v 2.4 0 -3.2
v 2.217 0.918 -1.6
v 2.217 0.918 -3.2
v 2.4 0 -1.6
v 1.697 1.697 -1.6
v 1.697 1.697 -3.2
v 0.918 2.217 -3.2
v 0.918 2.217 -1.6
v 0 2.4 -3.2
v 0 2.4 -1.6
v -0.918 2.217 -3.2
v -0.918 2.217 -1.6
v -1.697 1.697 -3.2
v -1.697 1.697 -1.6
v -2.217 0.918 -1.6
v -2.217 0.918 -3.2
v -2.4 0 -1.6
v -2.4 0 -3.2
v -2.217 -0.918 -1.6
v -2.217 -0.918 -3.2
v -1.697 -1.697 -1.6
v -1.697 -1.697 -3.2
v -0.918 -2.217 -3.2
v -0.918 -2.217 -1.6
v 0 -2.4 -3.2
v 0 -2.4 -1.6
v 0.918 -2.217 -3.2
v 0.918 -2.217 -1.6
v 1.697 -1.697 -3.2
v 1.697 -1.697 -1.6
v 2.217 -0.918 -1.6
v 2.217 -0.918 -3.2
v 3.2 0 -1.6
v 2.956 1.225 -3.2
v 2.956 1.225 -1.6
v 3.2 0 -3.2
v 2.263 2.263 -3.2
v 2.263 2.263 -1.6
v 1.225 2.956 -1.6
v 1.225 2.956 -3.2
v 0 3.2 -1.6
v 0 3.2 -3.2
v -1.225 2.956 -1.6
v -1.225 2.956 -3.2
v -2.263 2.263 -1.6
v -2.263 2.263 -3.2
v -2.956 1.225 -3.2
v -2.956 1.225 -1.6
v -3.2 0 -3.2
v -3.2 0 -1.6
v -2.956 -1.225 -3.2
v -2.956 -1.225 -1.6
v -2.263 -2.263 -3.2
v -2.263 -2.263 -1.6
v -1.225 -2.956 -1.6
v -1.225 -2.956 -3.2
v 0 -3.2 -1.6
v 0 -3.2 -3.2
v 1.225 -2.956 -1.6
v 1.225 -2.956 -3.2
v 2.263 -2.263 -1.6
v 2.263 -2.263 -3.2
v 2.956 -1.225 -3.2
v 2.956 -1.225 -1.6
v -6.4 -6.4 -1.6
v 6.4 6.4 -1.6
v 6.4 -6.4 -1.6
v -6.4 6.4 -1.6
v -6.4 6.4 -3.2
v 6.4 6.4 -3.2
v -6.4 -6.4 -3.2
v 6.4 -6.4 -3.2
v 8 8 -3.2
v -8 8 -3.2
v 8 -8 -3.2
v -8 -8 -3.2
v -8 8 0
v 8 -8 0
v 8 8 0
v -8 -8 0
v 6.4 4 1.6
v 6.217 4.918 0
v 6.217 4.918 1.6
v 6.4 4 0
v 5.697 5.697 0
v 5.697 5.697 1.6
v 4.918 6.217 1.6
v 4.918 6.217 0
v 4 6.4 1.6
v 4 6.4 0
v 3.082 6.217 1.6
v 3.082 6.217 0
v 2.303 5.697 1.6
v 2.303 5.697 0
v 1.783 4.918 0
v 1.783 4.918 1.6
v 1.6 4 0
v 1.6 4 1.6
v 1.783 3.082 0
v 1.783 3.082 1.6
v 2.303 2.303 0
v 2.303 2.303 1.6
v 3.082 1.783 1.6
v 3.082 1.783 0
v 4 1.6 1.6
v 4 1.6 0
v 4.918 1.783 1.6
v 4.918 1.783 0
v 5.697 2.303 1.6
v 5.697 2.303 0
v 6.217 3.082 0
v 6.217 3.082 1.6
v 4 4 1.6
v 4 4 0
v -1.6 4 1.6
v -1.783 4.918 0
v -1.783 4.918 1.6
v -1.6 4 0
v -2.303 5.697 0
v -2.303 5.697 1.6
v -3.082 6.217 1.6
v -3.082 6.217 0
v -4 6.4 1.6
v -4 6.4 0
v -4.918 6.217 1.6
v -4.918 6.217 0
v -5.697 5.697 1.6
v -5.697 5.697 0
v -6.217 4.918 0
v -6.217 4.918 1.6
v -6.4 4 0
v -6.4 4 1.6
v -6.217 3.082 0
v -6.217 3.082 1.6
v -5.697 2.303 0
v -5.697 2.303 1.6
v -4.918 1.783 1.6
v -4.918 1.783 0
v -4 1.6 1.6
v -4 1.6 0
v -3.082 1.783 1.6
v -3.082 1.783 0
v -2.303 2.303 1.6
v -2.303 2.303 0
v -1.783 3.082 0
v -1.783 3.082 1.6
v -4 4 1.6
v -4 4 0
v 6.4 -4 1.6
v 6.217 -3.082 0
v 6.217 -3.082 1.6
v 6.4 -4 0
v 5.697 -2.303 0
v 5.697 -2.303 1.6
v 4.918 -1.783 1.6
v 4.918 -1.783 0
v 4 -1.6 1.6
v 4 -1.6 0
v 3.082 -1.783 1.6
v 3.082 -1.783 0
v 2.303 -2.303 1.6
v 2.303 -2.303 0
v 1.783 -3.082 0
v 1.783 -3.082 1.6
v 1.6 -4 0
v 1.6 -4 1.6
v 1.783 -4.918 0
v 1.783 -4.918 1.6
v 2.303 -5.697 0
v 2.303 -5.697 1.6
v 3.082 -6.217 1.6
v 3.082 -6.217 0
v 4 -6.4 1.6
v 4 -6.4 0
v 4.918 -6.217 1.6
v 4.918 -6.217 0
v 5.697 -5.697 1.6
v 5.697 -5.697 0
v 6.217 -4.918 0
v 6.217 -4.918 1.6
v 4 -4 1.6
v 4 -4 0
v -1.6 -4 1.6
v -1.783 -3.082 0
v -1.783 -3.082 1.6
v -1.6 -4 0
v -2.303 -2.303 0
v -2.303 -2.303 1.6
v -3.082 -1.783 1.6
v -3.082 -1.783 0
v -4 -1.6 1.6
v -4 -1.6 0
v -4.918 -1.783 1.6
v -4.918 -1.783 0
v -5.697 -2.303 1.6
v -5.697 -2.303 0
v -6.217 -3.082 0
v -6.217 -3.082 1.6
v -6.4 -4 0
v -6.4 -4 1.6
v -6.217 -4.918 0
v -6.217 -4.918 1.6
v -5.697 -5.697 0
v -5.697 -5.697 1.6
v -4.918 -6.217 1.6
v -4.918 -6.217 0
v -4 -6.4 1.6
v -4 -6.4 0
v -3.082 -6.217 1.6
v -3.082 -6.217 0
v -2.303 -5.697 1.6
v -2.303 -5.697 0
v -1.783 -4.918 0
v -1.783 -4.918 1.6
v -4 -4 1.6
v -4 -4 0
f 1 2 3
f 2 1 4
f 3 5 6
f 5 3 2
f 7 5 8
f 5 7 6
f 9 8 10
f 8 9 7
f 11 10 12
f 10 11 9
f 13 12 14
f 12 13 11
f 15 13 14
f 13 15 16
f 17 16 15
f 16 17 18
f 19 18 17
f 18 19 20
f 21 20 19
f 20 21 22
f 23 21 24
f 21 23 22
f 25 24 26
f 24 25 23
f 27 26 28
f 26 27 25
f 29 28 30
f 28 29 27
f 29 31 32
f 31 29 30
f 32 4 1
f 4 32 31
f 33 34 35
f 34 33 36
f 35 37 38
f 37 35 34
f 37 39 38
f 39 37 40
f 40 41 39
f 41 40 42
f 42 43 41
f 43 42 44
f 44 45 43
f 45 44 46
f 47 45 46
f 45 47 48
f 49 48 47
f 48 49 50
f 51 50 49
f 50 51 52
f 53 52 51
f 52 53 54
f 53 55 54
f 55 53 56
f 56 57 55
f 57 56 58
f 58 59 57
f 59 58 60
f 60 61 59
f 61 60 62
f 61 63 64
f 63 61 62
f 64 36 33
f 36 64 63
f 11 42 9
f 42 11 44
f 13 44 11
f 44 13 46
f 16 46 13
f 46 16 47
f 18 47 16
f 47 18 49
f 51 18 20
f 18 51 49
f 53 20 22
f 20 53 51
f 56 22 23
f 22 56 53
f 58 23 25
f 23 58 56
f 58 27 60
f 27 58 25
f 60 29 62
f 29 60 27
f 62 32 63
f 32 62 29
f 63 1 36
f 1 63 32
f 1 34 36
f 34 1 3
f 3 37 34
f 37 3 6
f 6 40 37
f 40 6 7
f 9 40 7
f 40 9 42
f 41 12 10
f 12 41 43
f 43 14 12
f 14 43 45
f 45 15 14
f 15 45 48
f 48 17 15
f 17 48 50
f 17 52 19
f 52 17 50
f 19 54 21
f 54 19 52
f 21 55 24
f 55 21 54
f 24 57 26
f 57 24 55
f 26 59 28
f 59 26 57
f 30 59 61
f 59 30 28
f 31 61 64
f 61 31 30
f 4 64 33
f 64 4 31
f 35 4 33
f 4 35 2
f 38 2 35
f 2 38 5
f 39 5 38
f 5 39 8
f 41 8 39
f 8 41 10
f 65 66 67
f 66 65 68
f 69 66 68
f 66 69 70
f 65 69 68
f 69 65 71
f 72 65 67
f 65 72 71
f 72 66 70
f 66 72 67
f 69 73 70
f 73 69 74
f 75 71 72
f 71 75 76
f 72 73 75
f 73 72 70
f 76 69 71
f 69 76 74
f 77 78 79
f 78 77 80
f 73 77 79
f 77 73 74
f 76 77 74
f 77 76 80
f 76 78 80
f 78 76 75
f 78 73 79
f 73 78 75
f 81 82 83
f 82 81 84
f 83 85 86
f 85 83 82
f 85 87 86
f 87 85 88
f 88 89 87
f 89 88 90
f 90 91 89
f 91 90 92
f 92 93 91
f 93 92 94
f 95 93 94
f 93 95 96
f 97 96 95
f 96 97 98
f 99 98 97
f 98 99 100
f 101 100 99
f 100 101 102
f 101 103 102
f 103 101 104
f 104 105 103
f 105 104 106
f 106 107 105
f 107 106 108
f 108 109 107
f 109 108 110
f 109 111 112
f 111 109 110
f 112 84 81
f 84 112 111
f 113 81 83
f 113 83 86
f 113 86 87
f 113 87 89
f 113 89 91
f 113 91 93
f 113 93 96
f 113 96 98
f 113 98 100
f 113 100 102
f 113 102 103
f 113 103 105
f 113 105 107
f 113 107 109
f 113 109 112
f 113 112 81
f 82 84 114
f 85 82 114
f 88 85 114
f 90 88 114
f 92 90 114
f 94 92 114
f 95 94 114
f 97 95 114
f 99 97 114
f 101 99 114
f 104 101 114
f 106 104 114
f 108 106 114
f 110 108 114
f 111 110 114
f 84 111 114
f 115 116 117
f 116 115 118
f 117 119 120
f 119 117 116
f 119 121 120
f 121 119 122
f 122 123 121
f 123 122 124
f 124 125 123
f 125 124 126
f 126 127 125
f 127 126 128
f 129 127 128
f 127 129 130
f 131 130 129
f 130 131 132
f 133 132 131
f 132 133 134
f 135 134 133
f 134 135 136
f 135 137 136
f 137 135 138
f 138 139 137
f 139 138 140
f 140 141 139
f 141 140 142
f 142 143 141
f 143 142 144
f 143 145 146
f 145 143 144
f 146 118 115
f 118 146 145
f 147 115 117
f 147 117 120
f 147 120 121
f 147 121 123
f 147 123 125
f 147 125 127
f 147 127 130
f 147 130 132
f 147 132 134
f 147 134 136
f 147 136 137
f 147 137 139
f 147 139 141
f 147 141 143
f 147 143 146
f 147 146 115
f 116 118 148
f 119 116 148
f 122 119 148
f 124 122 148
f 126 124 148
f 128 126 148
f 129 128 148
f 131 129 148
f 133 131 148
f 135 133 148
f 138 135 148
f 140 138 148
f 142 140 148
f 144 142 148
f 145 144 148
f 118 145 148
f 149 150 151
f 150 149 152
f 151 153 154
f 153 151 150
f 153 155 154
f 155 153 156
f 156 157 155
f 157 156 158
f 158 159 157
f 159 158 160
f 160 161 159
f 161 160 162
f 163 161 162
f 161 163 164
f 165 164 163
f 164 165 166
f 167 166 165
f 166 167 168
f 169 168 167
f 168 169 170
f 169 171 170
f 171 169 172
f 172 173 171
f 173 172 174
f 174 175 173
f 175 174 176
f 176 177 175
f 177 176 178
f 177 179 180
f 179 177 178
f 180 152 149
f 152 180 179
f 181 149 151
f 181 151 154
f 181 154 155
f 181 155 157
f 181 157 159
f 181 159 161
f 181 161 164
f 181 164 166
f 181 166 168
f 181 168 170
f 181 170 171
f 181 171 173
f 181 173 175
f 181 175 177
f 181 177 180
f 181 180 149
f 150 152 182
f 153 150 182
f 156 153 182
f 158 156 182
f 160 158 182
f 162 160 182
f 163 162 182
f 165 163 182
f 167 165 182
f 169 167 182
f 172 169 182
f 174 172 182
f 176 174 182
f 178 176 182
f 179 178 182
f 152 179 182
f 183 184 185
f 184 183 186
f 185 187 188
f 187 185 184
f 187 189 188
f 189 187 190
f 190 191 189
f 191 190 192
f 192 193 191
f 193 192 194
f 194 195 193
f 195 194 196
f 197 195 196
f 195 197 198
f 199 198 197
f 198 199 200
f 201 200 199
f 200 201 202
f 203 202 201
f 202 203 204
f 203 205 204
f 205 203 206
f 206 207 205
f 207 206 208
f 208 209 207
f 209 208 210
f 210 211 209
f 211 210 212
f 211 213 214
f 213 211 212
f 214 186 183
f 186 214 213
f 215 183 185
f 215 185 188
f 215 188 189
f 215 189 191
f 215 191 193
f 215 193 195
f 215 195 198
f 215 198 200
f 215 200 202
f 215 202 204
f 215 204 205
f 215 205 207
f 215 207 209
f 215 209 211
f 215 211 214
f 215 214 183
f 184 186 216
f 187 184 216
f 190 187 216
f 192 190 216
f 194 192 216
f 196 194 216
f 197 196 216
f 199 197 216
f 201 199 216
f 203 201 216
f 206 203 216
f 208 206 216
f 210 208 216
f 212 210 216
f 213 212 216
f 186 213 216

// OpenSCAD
// file: ../p/4-4ring3.scad
use <../lib.scad>
$fa=1; $fs=0.2;
function ldraw_lib__4_4ring3(realsolid=false) = [
// 0 Ring  3 x 1.0
// 0 Name: 4-4ring3.dat
// 0 Author: James Jessiman
// 0 !LDRAW_ORG Primitive UPDATE 2009-01
// 0 !LICENSE Licensed under CC BY 2.0 and CC BY 4.0 : see CAreadme.txt
// 
// 0 BFC CERTIFY CCW
  [0,"BFC","CERTIFY"],
  [0,"BFC","CCW"],
// 
// 0 !HISTORY 1998-12-15 [PTadmin] Official Update 1998-10
// 0 !HISTORY 2002-04-05 [hafhead] Added BFC statement
// 0 !HISTORY 2002-04-25 [PTadmin] Official Update 2002-02
// 0 !HISTORY 2007-06-24 [PTadmin] Header formatted for Contributor Agreement
// 0 !HISTORY 2008-07-01 [PTadmin] Official Update 2008-01
// 0 !HISTORY 2008-08-26 [cwdee] Switch polygon winding and rename
// 0 !HISTORY 2009-05-02 [PTadmin] Official Update 2009-01
// 
// 
// 4 16 -1.5308 0 3.6956 -1.1481 0 2.7717 0 0 3 0 0 4
  [4,16,-1.5308,0,3.6956,-1.1481,0,2.7717,0,0,3,0,0,4],
// 4 16 -2.8284 0 2.8284 -2.1213 0 2.1213 -1.1481 0 2.7717 -1.5308 0 3.6956
  [4,16,-2.8284,0,2.8284,-2.1213,0,2.1213,-1.1481,0,2.7717,-1.5308,0,3.6956],
// 4 16 -3.6956 0 1.5308 -2.7717 0 1.1481 -2.1213 0 2.1213 -2.8284 0 2.8284
  [4,16,-3.6956,0,1.5308,-2.7717,0,1.1481,-2.1213,0,2.1213,-2.8284,0,2.8284],
// 4 16 -4 0 0 -3 0 0 -2.7717 0 1.1481 -3.6956 0 1.5308
  [4,16,-4,0,0,-3,0,0,-2.7717,0,1.1481,-3.6956,0,1.5308],
// 4 16 -3.6956 0 -1.5308 -2.7717 0 -1.1481 -3 0 0 -4 0 0
  [4,16,-3.6956,0,-1.5308,-2.7717,0,-1.1481,-3,0,0,-4,0,0],
// 4 16 -2.8284 0 -2.8284 -2.1213 0 -2.1213 -2.7717 0 -1.1481 -3.6956 0 -1.5308
  [4,16,-2.8284,0,-2.8284,-2.1213,0,-2.1213,-2.7717,0,-1.1481,-3.6956,0,-1.5308],
// 4 16 -1.5308 0 -3.6956 -1.1481 0 -2.7717 -2.1213 0 -2.1213 -2.8284 0 -2.8284
  [4,16,-1.5308,0,-3.6956,-1.1481,0,-2.7717,-2.1213,0,-2.1213,-2.8284,0,-2.8284],
// 4 16 0 0 -4 0 0 -3 -1.1481 0 -2.7717 -1.5308 0 -3.6956
  [4,16,0,0,-4,0,0,-3,-1.1481,0,-2.7717,-1.5308,0,-3.6956],
// 4 16 1.5308 0 -3.6956 1.1481 0 -2.7717 0 0 -3 0 0 -4
  [4,16,1.5308,0,-3.6956,1.1481,0,-2.7717,0,0,-3,0,0,-4],
// 4 16 2.8284 0 -2.8284 2.1213 0 -2.1213 1.1481 0 -2.7717 1.5308 0 -3.6956
  [4,16,2.8284,0,-2.8284,2.1213,0,-2.1213,1.1481,0,-2.7717,1.5308,0,-3.6956],
// 4 16 3.6956 0 -1.5308 2.7717 0 -1.1481 2.1213 0 -2.1213 2.8284 0 -2.8284
  [4,16,3.6956,0,-1.5308,2.7717,0,-1.1481,2.1213,0,-2.1213,2.8284,0,-2.8284],
// 4 16 4 0 0 3 0 0 2.7717 0 -1.1481 3.6956 0 -1.5308
  [4,16,4,0,0,3,0,0,2.7717,0,-1.1481,3.6956,0,-1.5308],
// 4 16 3.6956 0 1.5308 2.7717 0 1.1481 3 0 0 4 0 0
  [4,16,3.6956,0,1.5308,2.7717,0,1.1481,3,0,0,4,0,0],
// 4 16 2.8284 0 2.8284 2.1213 0 2.1213 2.7717 0 1.1481 3.6956 0 1.5308
  [4,16,2.8284,0,2.8284,2.1213,0,2.1213,2.7717,0,1.1481,3.6956,0,1.5308],
// 4 16 1.5308 0 3.6956 1.1481 0 2.7717 2.1213 0 2.1213 2.8284 0 2.8284
  [4,16,1.5308,0,3.6956,1.1481,0,2.7717,2.1213,0,2.1213,2.8284,0,2.8284],
// 4 16 0 0 4 0 0 3 1.1481 0 2.7717 1.5308 0 3.6956
  [4,16,0,0,4,0,0,3,1.1481,0,2.7717,1.5308,0,3.6956],
// 0
];
module ldraw_lib__4_4ring3(step=0, col=false, unit=2/5, alt=false, line=0.2, solid=!$preview)
    makepoly(ldraw_lib__4_4ring3(solid), step=step, col=col, unit=unit, alt=alt, line=line, solid=solid);
ldraw_lib__4_4ring3(line=0.2);
// file: ../p/4-4edge.scad
use <../lib.scad>
function ldraw_lib__4_4edge() = [
// 0 Circle 1.0
// 0 Name: 4-4edge.dat
// 0 Author: James Jessiman
// 0 !LDRAW_ORG Primitive UPDATE 2017-01
// 0 !LICENSE Licensed under CC BY 2.0 and CC BY 4.0 : see CAreadme.txt
// 
// 0 BFC CERTIFY CCW
  [0,"BFC","CERTIFY"],
  [0,"BFC","CCW"],
// 
// 0 !HISTORY 1998-12-15 [PTadmin] Official Update 1998-10
// 0 !HISTORY 2005-12-28 [PTadmin] Official Update 2005-01
// 0 !HISTORY 2007-06-24 [PTadmin] Header formatted for Contributor Agreement
// 0 !HISTORY 2008-07-01 [PTadmin] Official Update 2008-01
// 0 !HISTORY 2017-01-15 [Steffen] BFCed
// 0 !HISTORY 2017-12-30 [PTadmin] Official Update 2017-01
// 
// 
// 2 24 1 0 0 0.9239 0 0.3827
  [2,24,1,0,0,0.9239,0,0.3827],
// 2 24 0.9239 0 0.3827 0.7071 0 0.7071
  [2,24,0.9239,0,0.3827,0.7071,0,0.7071],
// 2 24 0.7071 0 0.7071 0.3827 0 0.9239
  [2,24,0.7071,0,0.7071,0.3827,0,0.9239],
// 2 24 0.3827 0 0.9239 0 0 1
  [2,24,0.3827,0,0.9239,0,0,1],
// 2 24 0 0 1 -0.3827 0 0.9239
  [2,24,0,0,1,-0.3827,0,0.9239],
// 2 24 -0.3827 0 0.9239 -0.7071 0 0.7071
  [2,24,-0.3827,0,0.9239,-0.7071,0,0.7071],
// 2 24 -0.7071 0 0.7071 -0.9239 0 0.3827
  [2,24,-0.7071,0,0.7071,-0.9239,0,0.3827],
// 2 24 -0.9239 0 0.3827 -1 0 -0
  [2,24,-0.9239,0,0.3827,-1,0,-0],
// 2 24 -1 0 -0 -0.9239 0 -0.3827
  [2,24,-1,0,-0,-0.9239,0,-0.3827],
// 2 24 -0.9239 0 -0.3827 -0.7071 0 -0.7071
  [2,24,-0.9239,0,-0.3827,-0.7071,0,-0.7071],
// 2 24 -0.7071 0 -0.7071 -0.3827 0 -0.9239
  [2,24,-0.7071,0,-0.7071,-0.3827,0,-0.9239],
// 2 24 -0.3827 0 -0.9239 0 0 -1
  [2,24,-0.3827,0,-0.9239,0,0,-1],
// 2 24 0 0 -1 0.3827 0 -0.9239
  [2,24,0,0,-1,0.3827,0,-0.9239],
// 2 24 0.3827 0 -0.9239 0.7071 0 -0.7071
  [2,24,0.3827,0,-0.9239,0.7071,0,-0.7071],
// 2 24 0.7071 0 -0.7071 0.9239 0 -0.3827
  [2,24,0.7071,0,-0.7071,0.9239,0,-0.3827],
// 2 24 0.9239 0 -0.3827 1 0 0
  [2,24,0.9239,0,-0.3827,1,0,0],
];
module ldraw_lib__4_4edge(step=0, col=false, unit=2/5, alt=false, line=0.2, solid=!$preview)
    makepoly(ldraw_lib__4_4edge(), step=step, col=col, unit=unit, alt=alt, line=line, solid=solid);
ldraw_lib__4_4edge(line=0.2);
// file: ../p/4-4disc.scad
use <../lib.scad>
function ldraw_lib__4_4disc() = [
// 0 Disc 1.0
// 0 Name: 4-4disc.dat
// 0 Author: James Jessiman
// 0 !LDRAW_ORG Primitive UPDATE 2002-02
// 0 !LICENSE Licensed under CC BY 2.0 and CC BY 4.0 : see CAreadme.txt
// 
// 0 BFC CERTIFY CCW
  [0,"BFC","CERTIFY"],
  [0,"BFC","CCW"],
// 
// 0 !HISTORY 1998-12-15 [PTadmin] Official Update 1998-10
// 0 !HISTORY 2002-03-23 [sbliss] Added BFC statement
// 0 !HISTORY 2002-04-25 [PTadmin] Official Update 2002-02
// 0 !HISTORY 2007-06-24 [PTadmin] Header formatted for Contributor Agreement
// 0 !HISTORY 2008-07-01 [PTadmin] Official Update 2008-01
// 
// 
// 3 16 0 0 0 1 0 0 0.9239 0 0.3827
  [3,16,0,0,0,1,0,0,0.9239,0,0.3827],
// 3 16 0 0 0 0.9239 0 0.3827 0.7071 0 0.7071
  [3,16,0,0,0,0.9239,0,0.3827,0.7071,0,0.7071],
// 3 16 0 0 0 0.7071 0 0.7071 0.3827 0 0.9239
  [3,16,0,0,0,0.7071,0,0.7071,0.3827,0,0.9239],
// 3 16 0 0 0 0.3827 0 0.9239 0 0 1
  [3,16,0,0,0,0.3827,0,0.9239,0,0,1],
// 3 16 0 0 0 0 0 1 -0.3827 0 0.9239
  [3,16,0,0,0,0,0,1,-0.3827,0,0.9239],
// 3 16 0 0 0 -0.3827 0 0.9239 -0.7071 0 0.7071
  [3,16,0,0,0,-0.3827,0,0.9239,-0.7071,0,0.7071],
// 3 16 0 0 0 -0.7071 0 0.7071 -0.9239 0 0.3827
  [3,16,0,0,0,-0.7071,0,0.7071,-0.9239,0,0.3827],
// 3 16 0 0 0 -0.9239 0 0.3827 -1 0 -0
  [3,16,0,0,0,-0.9239,0,0.3827,-1,0,-0],
// 3 16 0 0 0 -1 0 -0 -0.9239 0 -0.3827
  [3,16,0,0,0,-1,0,-0,-0.9239,0,-0.3827],
// 3 16 0 0 0 -0.9239 0 -0.3827 -0.7071 0 -0.7071
  [3,16,0,0,0,-0.9239,0,-0.3827,-0.7071,0,-0.7071],
// 3 16 0 0 0 -0.7071 0 -0.7071 -0.3827 0 -0.9239
  [3,16,0,0,0,-0.7071,0,-0.7071,-0.3827,0,-0.9239],
// 3 16 0 0 0 -0.3827 0 -0.9239 0 0 -1
  [3,16,0,0,0,-0.3827,0,-0.9239,0,0,-1],
// 3 16 0 0 0 0 0 -1 0.3827 0 -0.9239
  [3,16,0,0,0,0,0,-1,0.3827,0,-0.9239],
// 3 16 0 0 0 0.3827 0 -0.9239 0.7071 0 -0.7071
  [3,16,0,0,0,0.3827,0,-0.9239,0.7071,0,-0.7071],
// 3 16 0 0 0 0.7071 0 -0.7071 0.9239 0 -0.3827
  [3,16,0,0,0,0.7071,0,-0.7071,0.9239,0,-0.3827],
// 3 16 0 0 0 0.9239 0 -0.3827 1 0 0
  [3,16,0,0,0,0.9239,0,-0.3827,1,0,0],
// 0
];
module ldraw_lib__4_4disc(step=0, col=false, unit=2/5, alt=false, line=0.2, solid=!$preview)
    makepoly(ldraw_lib__4_4disc(), step=step, col=col, unit=unit, alt=alt, line=line, solid=solid);
ldraw_lib__4_4disc(line=0.2);
// file: ../p/4-4cyli.scad
use <../lib.scad>
$fa=1; $fs=0.2;
function ldraw_lib__4_4cyli(realsolid=false) = [
// 0 Cylinder 1.0
// 0 Name: 4-4cyli.dat
// 0 Author: James Jessiman
// 0 !LDRAW_ORG Primitive UPDATE 2005-01
// 0 !LICENSE Licensed under CC BY 2.0 and CC BY 4.0 : see CAreadme.txt
// 
// 0 BFC CERTIFY CCW
  [0,"BFC","CERTIFY"],
  [0,"BFC","CCW"],
// 
// 0 !HISTORY 1998-12-15 [PTadmin] Official Update 1998-10
// 0 !HISTORY 2002-03-23 [sbliss] Added BFC statement; merged headers from files in distributions LDraw 0.27 and Complete.
// 0 !HISTORY 2002-04-25 [PTadmin] Official Update 2002-02
// 0 !HISTORY 2004-12-14 [guyvivan] BFC CCW
// 0 !HISTORY 2005-12-28 [PTadmin] Official Update 2005-01
// 0 !HISTORY 2007-06-24 [PTadmin] Header formatted for Contributor Agreement
// 0 !HISTORY 2008-07-01 [PTadmin] Official Update 2008-01
// 
// 
// 4 16 1 1 0 0.9239 1 0.3827 0.9239 0 0.3827 1 0 0
  [4,16,1,1,0,0.9239,1,0.3827,0.9239,0,0.3827,1,0,0],
// 5 24 1 0 0 1 1 0 0.9239 0 0.3827 0.9239 0 -0.3827
  [5,24,1,0,0,1,1,0,0.9239,0,0.3827,0.9239,0,-0.3827],
// 4 16 0.9239 1 0.3827 0.7071 1 0.7071 0.7071 0 0.7071 0.9239 0 0.3827
  [4,16,0.9239,1,0.3827,0.7071,1,0.7071,0.7071,0,0.7071,0.9239,0,0.3827],
// 5 24 0.9239 0 0.3827 0.9239 1 0.3827 0.7071 0 0.7071 1 0 0
  [5,24,0.9239,0,0.3827,0.9239,1,0.3827,0.7071,0,0.7071,1,0,0],
// 4 16 0.7071 1 0.7071 0.3827 1 0.9239 0.3827 0 0.9239 0.7071 0 0.7071
  [4,16,0.7071,1,0.7071,0.3827,1,0.9239,0.3827,0,0.9239,0.7071,0,0.7071],
// 5 24 0.7071 0 0.7071 0.7071 1 0.7071 0.3827 0 0.9239 0.9239 0 0.3827
  [5,24,0.7071,0,0.7071,0.7071,1,0.7071,0.3827,0,0.9239,0.9239,0,0.3827],
// 4 16 0.3827 1 0.9239 0 1 1 0 0 1 0.3827 0 0.9239
  [4,16,0.3827,1,0.9239,0,1,1,0,0,1,0.3827,0,0.9239],
// 5 24 0.3827 0 0.9239 0.3827 1 0.9239 0 0 1 0.7071 0 0.7071
  [5,24,0.3827,0,0.9239,0.3827,1,0.9239,0,0,1,0.7071,0,0.7071],
// 4 16 0 1 1 -0.3827 1 0.9239 -0.3827 0 0.9239 0 0 1
  [4,16,0,1,1,-0.3827,1,0.9239,-0.3827,0,0.9239,0,0,1],
// 5 24 0 0 1 0 1 1 -0.3827 0 0.9239 0.3827 0 0.9239
  [5,24,0,0,1,0,1,1,-0.3827,0,0.9239,0.3827,0,0.9239],
// 4 16 -0.3827 1 0.9239 -0.7071 1 0.7071 -0.7071 0 0.7071 -0.3827 0 0.9239
  [4,16,-0.3827,1,0.9239,-0.7071,1,0.7071,-0.7071,0,0.7071,-0.3827,0,0.9239],
// 5 24 -0.3827 0 0.9239 -0.3827 1 0.9239 -0.7071 0 0.7071 0 0 1
  [5,24,-0.3827,0,0.9239,-0.3827,1,0.9239,-0.7071,0,0.7071,0,0,1],
// 4 16 -0.7071 1 0.7071 -0.9239 1 0.3827 -0.9239 0 0.3827 -0.7071 0 0.7071
  [4,16,-0.7071,1,0.7071,-0.9239,1,0.3827,-0.9239,0,0.3827,-0.7071,0,0.7071],
// 5 24 -0.7071 0 0.7071 -0.7071 1 0.7071 -0.9239 0 0.3827 -0.3827 0 0.9239
  [5,24,-0.7071,0,0.7071,-0.7071,1,0.7071,-0.9239,0,0.3827,-0.3827,0,0.9239],
// 4 16 -0.9239 1 0.3827 -1 1 0 -1 0 0 -0.9239 0 0.3827
  [4,16,-0.9239,1,0.3827,-1,1,0,-1,0,0,-0.9239,0,0.3827],
// 5 24 -0.9239 0 0.3827 -0.9239 1 0.3827 -1 0 0 -0.7071 0 0.7071
  [5,24,-0.9239,0,0.3827,-0.9239,1,0.3827,-1,0,0,-0.7071,0,0.7071],
// 4 16 -1 1 0 -0.9239 1 -0.3827 -0.9239 0 -0.3827 -1 0 0
  [4,16,-1,1,0,-0.9239,1,-0.3827,-0.9239,0,-0.3827,-1,0,0],
// 5 24 -1 0 0 -1 1 0 -0.9239 0 -0.3827 -0.9239 0 0.3827
  [5,24,-1,0,0,-1,1,0,-0.9239,0,-0.3827,-0.9239,0,0.3827],
// 4 16 -0.9239 1 -0.3827 -0.7071 1 -0.7071 -0.7071 0 -0.7071 -0.9239 0 -0.3827
  [4,16,-0.9239,1,-0.3827,-0.7071,1,-0.7071,-0.7071,0,-0.7071,-0.9239,0,-0.3827],
// 5 24 -0.9239 0 -0.3827 -0.9239 1 -0.3827 -0.7071 0 -0.7071 -1 0 0
  [5,24,-0.9239,0,-0.3827,-0.9239,1,-0.3827,-0.7071,0,-0.7071,-1,0,0],
// 4 16 -0.7071 1 -0.7071 -0.3827 1 -0.9239 -0.3827 0 -0.9239 -0.7071 0 -0.7071
  [4,16,-0.7071,1,-0.7071,-0.3827,1,-0.9239,-0.3827,0,-0.9239,-0.7071,0,-0.7071],
// 5 24 -0.7071 0 -0.7071 -0.7071 1 -0.7071 -0.3827 0 -0.9239 -0.9239 0 -0.3827
  [5,24,-0.7071,0,-0.7071,-0.7071,1,-0.7071,-0.3827,0,-0.9239,-0.9239,0,-0.3827],
// 4 16 -0.3827 1 -0.9239 0 1 -1 0 0 -1 -0.3827 0 -0.9239
  [4,16,-0.3827,1,-0.9239,0,1,-1,0,0,-1,-0.3827,0,-0.9239],
// 5 24 -0.3827 0 -0.9239 -0.3827 1 -0.9239 0 0 -1 -0.7071 0 -0.7071
  [5,24,-0.3827,0,-0.9239,-0.3827,1,-0.9239,0,0,-1,-0.7071,0,-0.7071],
// 4 16 0 1 -1 0.3827 1 -0.9239 0.3827 0 -0.9239 0 0 -1
  [4,16,0,1,-1,0.3827,1,-0.9239,0.3827,0,-0.9239,0,0,-1],
// 5 24 0 0 -1 0 1 -1 0.3827 0 -0.9239 -0.3827 0 -0.9239
  [5,24,0,0,-1,0,1,-1,0.3827,0,-0.9239,-0.3827,0,-0.9239],
// 4 16 0.3827 1 -0.9239 0.7071 1 -0.7071 0.7071 0 -0.7071 0.3827 0 -0.9239
  [4,16,0.3827,1,-0.9239,0.7071,1,-0.7071,0.7071,0,-0.7071,0.3827,0,-0.9239],
// 5 24 0.3827 0 -0.9239 0.3827 1 -0.9239 0.7071 0 -0.7071 0 0 -1
  [5,24,0.3827,0,-0.9239,0.3827,1,-0.9239,0.7071,0,-0.7071,0,0,-1],
// 4 16 0.7071 1 -0.7071 0.9239 1 -0.3827 0.9239 0 -0.3827 0.7071 0 -0.7071
  [4,16,0.7071,1,-0.7071,0.9239,1,-0.3827,0.9239,0,-0.3827,0.7071,0,-0.7071],
// 5 24 0.7071 0 -0.7071 0.7071 1 -0.7071 0.9239 0 -0.3827 0.3827 0 -0.9239
  [5,24,0.7071,0,-0.7071,0.7071,1,-0.7071,0.9239,0,-0.3827,0.3827,0,-0.9239],
// 4 16 0.9239 1 -0.3827 1 1 0 1 0 0 0.9239 0 -0.3827
  [4,16,0.9239,1,-0.3827,1,1,0,1,0,0,0.9239,0,-0.3827],
// 5 24 0.9239 0 -0.3827 0.9239 1 -0.3827 1 0 0 0.7071 0 -0.7071
  [5,24,0.9239,0,-0.3827,0.9239,1,-0.3827,1,0,0,0.7071,0,-0.7071],
// 0
];
module ldraw_lib__4_4cyli(step=0, col=false, unit=2/5, alt=false, line=0.2, solid=!$preview)
    makepoly(ldraw_lib__4_4cyli(solid), step=step, col=col, unit=unit, alt=alt, line=line, solid=solid);
ldraw_lib__4_4cyli(line=0.2);
// file: ../p/stud4.scad
use <../lib.scad>
use <4-4cyli.scad>
use <4-4edge.scad>
use <4-4ring3.scad>
function ldraw_lib__stud4() = [
// 0 Stud Tube Open
// 0 Name: stud4.dat
// 0 Author: James Jessiman
// 0 !LDRAW_ORG Primitive UPDATE 2009-02
// 0 !LICENSE Licensed under CC BY 4.0 : see CAreadme.txt
// 
// 0 BFC CERTIFY CCW
  [0,"BFC","CERTIFY"],
  [0,"BFC","CCW"],
// 
// 0 !HISTORY 1999-07-05 [PTadmin] Official Update 1999-05
// 0 !HISTORY 2002-04-04 [sbliss] Modified for BFC compliance
// 0 !HISTORY 2002-04-25 [PTadmin] Official Update 2002-02
// 0 !HISTORY 2007-06-24 [PTadmin] Header formatted for Contributor Agreement
// 0 !HISTORY 2008-07-01 [PTadmin] Official Update 2008-01
// 0 !HISTORY 2009-06-21 [cwdee] Update ring references to 4-4ring
// 0 !HISTORY 2009-09-03 [PTadmin] Official Update 2009-02
// 
// 
// 1 16 0 -4 0 6 0 0 0 1 0 0 0 6 4-4edge.dat
  [1,16,0,-4,0,6,0,0,0,1,0,0,0,6, ldraw_lib__4_4edge()],
// 1 16 0 -4 0 8 0 0 0 1 0 0 0 8 4-4edge.dat
  [1,16,0,-4,0,8,0,0,0,1,0,0,0,8, ldraw_lib__4_4edge()],
// 1 16 0 0 0 6 0 0 0 1 0 0 0 6 4-4edge.dat
  [1,16,0,0,0,6,0,0,0,1,0,0,0,6, ldraw_lib__4_4edge()],
// 1 16 0 0 0 8 0 0 0 1 0 0 0 8 4-4edge.dat
  [1,16,0,0,0,8,0,0,0,1,0,0,0,8, ldraw_lib__4_4edge()],
// 0 BFC INVERTNEXT
  [0,"BFC","INVERTNEXT"],
// 1 16 0 -4 0 6 0 0 0 4 0 0 0 6 4-4cyli.dat
  [1,16,0,-4,0,6,0,0,0,4,0,0,0,6, ldraw_lib__4_4cyli()],
// 1 16 0 -4 0 8 0 0 0 4 0 0 0 8 4-4cyli.dat
  [1,16,0,-4,0,8,0,0,0,4,0,0,0,8, ldraw_lib__4_4cyli()],
// 1 16 0 -4 0 2 0 0 0 1 0 0 0 2 4-4ring3.dat
  [1,16,0,-4,0,2,0,0,0,1,0,0,0,2, ldraw_lib__4_4ring3()],
  [-1,16,0,0,0,2,0,0,0,-1,0,0,0,2, ldraw_lib__4_4ring3()],
// 0
];
module ldraw_lib__stud4(step=0, col=false, unit=2/5, alt=false, line=0.2, solid=!$preview)
    makepoly(ldraw_lib__stud4(), step=step, col=col, unit=unit, alt=alt, line=line, solid=solid);
ldraw_lib__stud4(line=0.2);
// file: ../p/stud.scad
use <../lib.scad>
use <4-4cyli.scad>
use <4-4disc.scad>
use <4-4edge.scad>
function ldraw_lib__stud() = [
// 0 Stud
// 0 Name: stud.dat
// 0 Author: James Jessiman
// 0 !LDRAW_ORG Primitive UPDATE 2012-01
// 0 !LICENSE Licensed under CC BY 4.0 : see CAreadme.txt
// 
// 0 BFC CERTIFY CCW
  [0,"BFC","CERTIFY"],
  [0,"BFC","CCW"],
// 
// 0 !HISTORY 2002-04-04 [sbliss] Modified for BFC compliance
// 0 !HISTORY 2002-04-25 [PTadmin] Official Update 2002-02
// 0 !HISTORY 2007-06-24 [PTadmin] Header formatted for Contributor Agreement
// 0 !HISTORY 2008-07-01 [PTadmin] Official Update 2008-01
// 0 !HISTORY 2012-02-16 [Philo] Changed to CCW
// 0 !HISTORY 2012-03-30 [PTadmin] Official Update 2012-01
// 
// 
// 1 16 0 0 0 6 0 0 0 1 0 0 0 6 4-4edge.dat
  [1,16,0,0,0,6,0,0,0,1,0,0,0,6, ldraw_lib__4_4edge()],
// 1 16 0 -4 0 6 0 0 0 1 0 0 0 6 4-4edge.dat
  [1,16,0,-4,0,6,0,0,0,1,0,0,0,6, ldraw_lib__4_4edge()],
// 1 16 0 0 0 6 0 0 0 -4 0 0 0 6 4-4cyli.dat
  [1,16,0,0,0,6,0,0,0,-4,0,0,0,6, ldraw_lib__4_4cyli()],
// 1 16 0 -4 0 6 0 0 0 1 0 0 0 6 4-4disc.dat
  [1,16,0,-4,0,6,0,0,0,1,0,0,0,6, ldraw_lib__4_4disc()],
  [-1,16,0,0,0,6,0,0,0,-1,0,0,0,6, ldraw_lib__4_4disc()],
];
module ldraw_lib__stud(step=0, col=false, unit=2/5, alt=false, line=0.2, solid=!$preview)
    makepoly(ldraw_lib__stud(), step=step, col=col, unit=unit, alt=alt, line=line, solid=solid);
ldraw_lib__stud(line=0.2);
// file: ../p/box5.scad
use <../lib.scad>
function ldraw_lib__box5() = [
// 0 Box with 5 Faces and All Edges
// 0 Name: box5.dat
// 0 Author: James Jessiman
// 0 !LDRAW_ORG Primitive UPDATE 2012-01
// 0 !LICENSE Licensed under CC BY 2.0 and CC BY 4.0 : see CAreadme.txt
// 
// 0 BFC CERTIFY CCW
  [0,"BFC","CERTIFY"],
  [0,"BFC","CCW"],
// 
// 0 !HISTORY 2002-04-03 [sbliss] Modified for BFC compliance
// 0 !HISTORY 2002-04-25 [PTadmin] Official Update 2002-02
// 0 !HISTORY 2007-06-24 [PTadmin] Header formatted for Contributor Agreement
// 0 !HISTORY 2008-07-01 [PTadmin] Official Update 2008-01
// 0 !HISTORY 2012-02-16 [Philo] Changed to CCW
// 0 !HISTORY 2012-03-30 [PTadmin] Official Update 2012-01
// 
// 
// 2 24 1 1 1 -1 1 1
  [2,24,1,1,1,-1,1,1],
// 2 24 -1 1 1 -1 1 -1
  [2,24,-1,1,1,-1,1,-1],
// 2 24 -1 1 -1 1 1 -1
  [2,24,-1,1,-1,1,1,-1],
// 2 24 1 1 -1 1 1 1
  [2,24,1,1,-1,1,1,1],
// 2 24 1 0 1 -1 0 1
  [2,24,1,0,1,-1,0,1],
// 2 24 -1 0 1 -1 0 -1
  [2,24,-1,0,1,-1,0,-1],
// 2 24 -1 0 -1 1 0 -1
  [2,24,-1,0,-1,1,0,-1],
// 2 24 1 0 -1 1 0 1
  [2,24,1,0,-1,1,0,1],
// 2 24 1 0 1 1 1 1
  [2,24,1,0,1,1,1,1],
// 2 24 -1 0 1 -1 1 1
  [2,24,-1,0,1,-1,1,1],
// 2 24 1 0 -1 1 1 -1
  [2,24,1,0,-1,1,1,-1],
// 2 24 -1 0 -1 -1 1 -1
  [2,24,-1,0,-1,-1,1,-1],
// 4 16 -1 1 1 1 1 1 1 1 -1 -1 1 -1
  [4,16,-1,1,1,1,1,1,1,1,-1,-1,1,-1],
// 4 16 -1 1 1 -1 0 1 1 0 1 1 1 1
  [4,16,-1,1,1,-1,0,1,1,0,1,1,1,1],
// 4 16 -1 1 -1 -1 0 -1 -1 0 1 -1 1 1
  [4,16,-1,1,-1,-1,0,-1,-1,0,1,-1,1,1],
// 4 16 1 1 -1 1 0 -1 -1 0 -1 -1 1 -1
  [4,16,1,1,-1,1,0,-1,-1,0,-1,-1,1,-1],
// 4 16 1 1 1 1 0 1 1 0 -1 1 1 -1
  [4,16,1,1,1,1,0,1,1,0,-1,1,1,-1],
];
makepoly(ldraw_lib__box5(), line=0.2);
// main file
use <../lib.scad>
use <../p/box5.scad>
use <../p/stud.scad>
use <../p/stud4.scad>
function ldraw_lib__3022() = [
// 0 Plate  2 x  2
// 0 Name: 3022.dat
// 0 Author: James Jessiman
// 0 !LDRAW_ORG Part UPDATE 2002-03
// 0 !LICENSE Licensed under CC BY 4.0 : see CAreadme.txt
// 
// 0 BFC CERTIFY CCW
  [0,"BFC","CERTIFY"],
  [0,"BFC","CCW"],
// 
// 0 !HISTORY 2001-10-26 [PTadmin] Official Update 2001-01
// 0 !HISTORY 2002-05-07 {unknown} BFC Certification
// 0 !HISTORY 2002-06-11 [PTadmin] Official Update 2002-03
// 0 !HISTORY 2007-06-07 [PTadmin] Header formatted for Contributor Agreement
// 0 !HISTORY 2008-07-01 [PTadmin] Official Update 2008-01
// 
// 
// 1 16 0 4 0 1 0 0 0 -1 0 0 0 1 stud4.dat
  [1,16,0,4,0,1,0,0,0,-1,0,0,0,1, ldraw_lib__stud4()],
// 
// 0 BFC INVERTNEXT
  [0,"BFC","INVERTNEXT"],
// 1 16 0 8 0 16 0 0 0 -4 0 0 0 16 box5.dat
  [1,16,0,8,0,16,0,0,0,-4,0,0,0,16, ldraw_lib__box5()],
// 
// 4 16 20 8 20 16 8 16 -16 8 16 -20 8 20
  [4,16,20,8,20,16,8,16,-16,8,16,-20,8,20],
// 0 // Next Line was 4 16 20 8 -20 16 8 -16 -16 8 -16 -20 8 -20
// 4 16 -20 8 -20 -16 8 -16 16 8 -16 20 8 -20
  [4,16,-20,8,-20,-16,8,-16,16,8,-16,20,8,-20],
// 0 // Next Line was 4 16 20 8 20 16 8 16 16 8 -16 20 8 -20
// 4 16 20 8 -20 16 8 -16 16 8 16 20 8 20
  [4,16,20,8,-20,16,8,-16,16,8,16,20,8,20],
// 4 16 -20 8 20 -16 8 16 -16 8 -16 -20 8 -20
  [4,16,-20,8,20,-16,8,16,-16,8,-16,-20,8,-20],
// 
// 1 16 0 8 0 20 0 0 0 -8 0 0 0 20 box5.dat
  [1,16,0,8,0,20,0,0,0,-8,0,0,0,20, ldraw_lib__box5()],
// 
// 1 16 10 0 10 1 0 0 0 1 0 0 0 1 stud.dat
  [1,16,10,0,10,1,0,0,0,1,0,0,0,1, ldraw_lib__stud()],
// 1 16 -10 0 10 1 0 0 0 1 0 0 0 1 stud.dat
  [1,16,-10,0,10,1,0,0,0,1,0,0,0,1, ldraw_lib__stud()],
// 1 16 10 0 -10 1 0 0 0 1 0 0 0 1 stud.dat
  [1,16,10,0,-10,1,0,0,0,1,0,0,0,1, ldraw_lib__stud()],
// 1 16 -10 0 -10 1 0 0 0 1 0 0 0 1 stud.dat
  [1,16,-10,0,-10,1,0,0,0,1,0,0,0,1, ldraw_lib__stud()],
// 0
];
module ldraw_lib__3022(step=0, col=false, unit=2/5, alt=false, line=0.2, solid=!$preview)
    makepoly(ldraw_lib__3022(), step=step, col=col, unit=unit, alt=alt, line=line, solid=solid);
ldraw_lib__3022(line=0.2);
